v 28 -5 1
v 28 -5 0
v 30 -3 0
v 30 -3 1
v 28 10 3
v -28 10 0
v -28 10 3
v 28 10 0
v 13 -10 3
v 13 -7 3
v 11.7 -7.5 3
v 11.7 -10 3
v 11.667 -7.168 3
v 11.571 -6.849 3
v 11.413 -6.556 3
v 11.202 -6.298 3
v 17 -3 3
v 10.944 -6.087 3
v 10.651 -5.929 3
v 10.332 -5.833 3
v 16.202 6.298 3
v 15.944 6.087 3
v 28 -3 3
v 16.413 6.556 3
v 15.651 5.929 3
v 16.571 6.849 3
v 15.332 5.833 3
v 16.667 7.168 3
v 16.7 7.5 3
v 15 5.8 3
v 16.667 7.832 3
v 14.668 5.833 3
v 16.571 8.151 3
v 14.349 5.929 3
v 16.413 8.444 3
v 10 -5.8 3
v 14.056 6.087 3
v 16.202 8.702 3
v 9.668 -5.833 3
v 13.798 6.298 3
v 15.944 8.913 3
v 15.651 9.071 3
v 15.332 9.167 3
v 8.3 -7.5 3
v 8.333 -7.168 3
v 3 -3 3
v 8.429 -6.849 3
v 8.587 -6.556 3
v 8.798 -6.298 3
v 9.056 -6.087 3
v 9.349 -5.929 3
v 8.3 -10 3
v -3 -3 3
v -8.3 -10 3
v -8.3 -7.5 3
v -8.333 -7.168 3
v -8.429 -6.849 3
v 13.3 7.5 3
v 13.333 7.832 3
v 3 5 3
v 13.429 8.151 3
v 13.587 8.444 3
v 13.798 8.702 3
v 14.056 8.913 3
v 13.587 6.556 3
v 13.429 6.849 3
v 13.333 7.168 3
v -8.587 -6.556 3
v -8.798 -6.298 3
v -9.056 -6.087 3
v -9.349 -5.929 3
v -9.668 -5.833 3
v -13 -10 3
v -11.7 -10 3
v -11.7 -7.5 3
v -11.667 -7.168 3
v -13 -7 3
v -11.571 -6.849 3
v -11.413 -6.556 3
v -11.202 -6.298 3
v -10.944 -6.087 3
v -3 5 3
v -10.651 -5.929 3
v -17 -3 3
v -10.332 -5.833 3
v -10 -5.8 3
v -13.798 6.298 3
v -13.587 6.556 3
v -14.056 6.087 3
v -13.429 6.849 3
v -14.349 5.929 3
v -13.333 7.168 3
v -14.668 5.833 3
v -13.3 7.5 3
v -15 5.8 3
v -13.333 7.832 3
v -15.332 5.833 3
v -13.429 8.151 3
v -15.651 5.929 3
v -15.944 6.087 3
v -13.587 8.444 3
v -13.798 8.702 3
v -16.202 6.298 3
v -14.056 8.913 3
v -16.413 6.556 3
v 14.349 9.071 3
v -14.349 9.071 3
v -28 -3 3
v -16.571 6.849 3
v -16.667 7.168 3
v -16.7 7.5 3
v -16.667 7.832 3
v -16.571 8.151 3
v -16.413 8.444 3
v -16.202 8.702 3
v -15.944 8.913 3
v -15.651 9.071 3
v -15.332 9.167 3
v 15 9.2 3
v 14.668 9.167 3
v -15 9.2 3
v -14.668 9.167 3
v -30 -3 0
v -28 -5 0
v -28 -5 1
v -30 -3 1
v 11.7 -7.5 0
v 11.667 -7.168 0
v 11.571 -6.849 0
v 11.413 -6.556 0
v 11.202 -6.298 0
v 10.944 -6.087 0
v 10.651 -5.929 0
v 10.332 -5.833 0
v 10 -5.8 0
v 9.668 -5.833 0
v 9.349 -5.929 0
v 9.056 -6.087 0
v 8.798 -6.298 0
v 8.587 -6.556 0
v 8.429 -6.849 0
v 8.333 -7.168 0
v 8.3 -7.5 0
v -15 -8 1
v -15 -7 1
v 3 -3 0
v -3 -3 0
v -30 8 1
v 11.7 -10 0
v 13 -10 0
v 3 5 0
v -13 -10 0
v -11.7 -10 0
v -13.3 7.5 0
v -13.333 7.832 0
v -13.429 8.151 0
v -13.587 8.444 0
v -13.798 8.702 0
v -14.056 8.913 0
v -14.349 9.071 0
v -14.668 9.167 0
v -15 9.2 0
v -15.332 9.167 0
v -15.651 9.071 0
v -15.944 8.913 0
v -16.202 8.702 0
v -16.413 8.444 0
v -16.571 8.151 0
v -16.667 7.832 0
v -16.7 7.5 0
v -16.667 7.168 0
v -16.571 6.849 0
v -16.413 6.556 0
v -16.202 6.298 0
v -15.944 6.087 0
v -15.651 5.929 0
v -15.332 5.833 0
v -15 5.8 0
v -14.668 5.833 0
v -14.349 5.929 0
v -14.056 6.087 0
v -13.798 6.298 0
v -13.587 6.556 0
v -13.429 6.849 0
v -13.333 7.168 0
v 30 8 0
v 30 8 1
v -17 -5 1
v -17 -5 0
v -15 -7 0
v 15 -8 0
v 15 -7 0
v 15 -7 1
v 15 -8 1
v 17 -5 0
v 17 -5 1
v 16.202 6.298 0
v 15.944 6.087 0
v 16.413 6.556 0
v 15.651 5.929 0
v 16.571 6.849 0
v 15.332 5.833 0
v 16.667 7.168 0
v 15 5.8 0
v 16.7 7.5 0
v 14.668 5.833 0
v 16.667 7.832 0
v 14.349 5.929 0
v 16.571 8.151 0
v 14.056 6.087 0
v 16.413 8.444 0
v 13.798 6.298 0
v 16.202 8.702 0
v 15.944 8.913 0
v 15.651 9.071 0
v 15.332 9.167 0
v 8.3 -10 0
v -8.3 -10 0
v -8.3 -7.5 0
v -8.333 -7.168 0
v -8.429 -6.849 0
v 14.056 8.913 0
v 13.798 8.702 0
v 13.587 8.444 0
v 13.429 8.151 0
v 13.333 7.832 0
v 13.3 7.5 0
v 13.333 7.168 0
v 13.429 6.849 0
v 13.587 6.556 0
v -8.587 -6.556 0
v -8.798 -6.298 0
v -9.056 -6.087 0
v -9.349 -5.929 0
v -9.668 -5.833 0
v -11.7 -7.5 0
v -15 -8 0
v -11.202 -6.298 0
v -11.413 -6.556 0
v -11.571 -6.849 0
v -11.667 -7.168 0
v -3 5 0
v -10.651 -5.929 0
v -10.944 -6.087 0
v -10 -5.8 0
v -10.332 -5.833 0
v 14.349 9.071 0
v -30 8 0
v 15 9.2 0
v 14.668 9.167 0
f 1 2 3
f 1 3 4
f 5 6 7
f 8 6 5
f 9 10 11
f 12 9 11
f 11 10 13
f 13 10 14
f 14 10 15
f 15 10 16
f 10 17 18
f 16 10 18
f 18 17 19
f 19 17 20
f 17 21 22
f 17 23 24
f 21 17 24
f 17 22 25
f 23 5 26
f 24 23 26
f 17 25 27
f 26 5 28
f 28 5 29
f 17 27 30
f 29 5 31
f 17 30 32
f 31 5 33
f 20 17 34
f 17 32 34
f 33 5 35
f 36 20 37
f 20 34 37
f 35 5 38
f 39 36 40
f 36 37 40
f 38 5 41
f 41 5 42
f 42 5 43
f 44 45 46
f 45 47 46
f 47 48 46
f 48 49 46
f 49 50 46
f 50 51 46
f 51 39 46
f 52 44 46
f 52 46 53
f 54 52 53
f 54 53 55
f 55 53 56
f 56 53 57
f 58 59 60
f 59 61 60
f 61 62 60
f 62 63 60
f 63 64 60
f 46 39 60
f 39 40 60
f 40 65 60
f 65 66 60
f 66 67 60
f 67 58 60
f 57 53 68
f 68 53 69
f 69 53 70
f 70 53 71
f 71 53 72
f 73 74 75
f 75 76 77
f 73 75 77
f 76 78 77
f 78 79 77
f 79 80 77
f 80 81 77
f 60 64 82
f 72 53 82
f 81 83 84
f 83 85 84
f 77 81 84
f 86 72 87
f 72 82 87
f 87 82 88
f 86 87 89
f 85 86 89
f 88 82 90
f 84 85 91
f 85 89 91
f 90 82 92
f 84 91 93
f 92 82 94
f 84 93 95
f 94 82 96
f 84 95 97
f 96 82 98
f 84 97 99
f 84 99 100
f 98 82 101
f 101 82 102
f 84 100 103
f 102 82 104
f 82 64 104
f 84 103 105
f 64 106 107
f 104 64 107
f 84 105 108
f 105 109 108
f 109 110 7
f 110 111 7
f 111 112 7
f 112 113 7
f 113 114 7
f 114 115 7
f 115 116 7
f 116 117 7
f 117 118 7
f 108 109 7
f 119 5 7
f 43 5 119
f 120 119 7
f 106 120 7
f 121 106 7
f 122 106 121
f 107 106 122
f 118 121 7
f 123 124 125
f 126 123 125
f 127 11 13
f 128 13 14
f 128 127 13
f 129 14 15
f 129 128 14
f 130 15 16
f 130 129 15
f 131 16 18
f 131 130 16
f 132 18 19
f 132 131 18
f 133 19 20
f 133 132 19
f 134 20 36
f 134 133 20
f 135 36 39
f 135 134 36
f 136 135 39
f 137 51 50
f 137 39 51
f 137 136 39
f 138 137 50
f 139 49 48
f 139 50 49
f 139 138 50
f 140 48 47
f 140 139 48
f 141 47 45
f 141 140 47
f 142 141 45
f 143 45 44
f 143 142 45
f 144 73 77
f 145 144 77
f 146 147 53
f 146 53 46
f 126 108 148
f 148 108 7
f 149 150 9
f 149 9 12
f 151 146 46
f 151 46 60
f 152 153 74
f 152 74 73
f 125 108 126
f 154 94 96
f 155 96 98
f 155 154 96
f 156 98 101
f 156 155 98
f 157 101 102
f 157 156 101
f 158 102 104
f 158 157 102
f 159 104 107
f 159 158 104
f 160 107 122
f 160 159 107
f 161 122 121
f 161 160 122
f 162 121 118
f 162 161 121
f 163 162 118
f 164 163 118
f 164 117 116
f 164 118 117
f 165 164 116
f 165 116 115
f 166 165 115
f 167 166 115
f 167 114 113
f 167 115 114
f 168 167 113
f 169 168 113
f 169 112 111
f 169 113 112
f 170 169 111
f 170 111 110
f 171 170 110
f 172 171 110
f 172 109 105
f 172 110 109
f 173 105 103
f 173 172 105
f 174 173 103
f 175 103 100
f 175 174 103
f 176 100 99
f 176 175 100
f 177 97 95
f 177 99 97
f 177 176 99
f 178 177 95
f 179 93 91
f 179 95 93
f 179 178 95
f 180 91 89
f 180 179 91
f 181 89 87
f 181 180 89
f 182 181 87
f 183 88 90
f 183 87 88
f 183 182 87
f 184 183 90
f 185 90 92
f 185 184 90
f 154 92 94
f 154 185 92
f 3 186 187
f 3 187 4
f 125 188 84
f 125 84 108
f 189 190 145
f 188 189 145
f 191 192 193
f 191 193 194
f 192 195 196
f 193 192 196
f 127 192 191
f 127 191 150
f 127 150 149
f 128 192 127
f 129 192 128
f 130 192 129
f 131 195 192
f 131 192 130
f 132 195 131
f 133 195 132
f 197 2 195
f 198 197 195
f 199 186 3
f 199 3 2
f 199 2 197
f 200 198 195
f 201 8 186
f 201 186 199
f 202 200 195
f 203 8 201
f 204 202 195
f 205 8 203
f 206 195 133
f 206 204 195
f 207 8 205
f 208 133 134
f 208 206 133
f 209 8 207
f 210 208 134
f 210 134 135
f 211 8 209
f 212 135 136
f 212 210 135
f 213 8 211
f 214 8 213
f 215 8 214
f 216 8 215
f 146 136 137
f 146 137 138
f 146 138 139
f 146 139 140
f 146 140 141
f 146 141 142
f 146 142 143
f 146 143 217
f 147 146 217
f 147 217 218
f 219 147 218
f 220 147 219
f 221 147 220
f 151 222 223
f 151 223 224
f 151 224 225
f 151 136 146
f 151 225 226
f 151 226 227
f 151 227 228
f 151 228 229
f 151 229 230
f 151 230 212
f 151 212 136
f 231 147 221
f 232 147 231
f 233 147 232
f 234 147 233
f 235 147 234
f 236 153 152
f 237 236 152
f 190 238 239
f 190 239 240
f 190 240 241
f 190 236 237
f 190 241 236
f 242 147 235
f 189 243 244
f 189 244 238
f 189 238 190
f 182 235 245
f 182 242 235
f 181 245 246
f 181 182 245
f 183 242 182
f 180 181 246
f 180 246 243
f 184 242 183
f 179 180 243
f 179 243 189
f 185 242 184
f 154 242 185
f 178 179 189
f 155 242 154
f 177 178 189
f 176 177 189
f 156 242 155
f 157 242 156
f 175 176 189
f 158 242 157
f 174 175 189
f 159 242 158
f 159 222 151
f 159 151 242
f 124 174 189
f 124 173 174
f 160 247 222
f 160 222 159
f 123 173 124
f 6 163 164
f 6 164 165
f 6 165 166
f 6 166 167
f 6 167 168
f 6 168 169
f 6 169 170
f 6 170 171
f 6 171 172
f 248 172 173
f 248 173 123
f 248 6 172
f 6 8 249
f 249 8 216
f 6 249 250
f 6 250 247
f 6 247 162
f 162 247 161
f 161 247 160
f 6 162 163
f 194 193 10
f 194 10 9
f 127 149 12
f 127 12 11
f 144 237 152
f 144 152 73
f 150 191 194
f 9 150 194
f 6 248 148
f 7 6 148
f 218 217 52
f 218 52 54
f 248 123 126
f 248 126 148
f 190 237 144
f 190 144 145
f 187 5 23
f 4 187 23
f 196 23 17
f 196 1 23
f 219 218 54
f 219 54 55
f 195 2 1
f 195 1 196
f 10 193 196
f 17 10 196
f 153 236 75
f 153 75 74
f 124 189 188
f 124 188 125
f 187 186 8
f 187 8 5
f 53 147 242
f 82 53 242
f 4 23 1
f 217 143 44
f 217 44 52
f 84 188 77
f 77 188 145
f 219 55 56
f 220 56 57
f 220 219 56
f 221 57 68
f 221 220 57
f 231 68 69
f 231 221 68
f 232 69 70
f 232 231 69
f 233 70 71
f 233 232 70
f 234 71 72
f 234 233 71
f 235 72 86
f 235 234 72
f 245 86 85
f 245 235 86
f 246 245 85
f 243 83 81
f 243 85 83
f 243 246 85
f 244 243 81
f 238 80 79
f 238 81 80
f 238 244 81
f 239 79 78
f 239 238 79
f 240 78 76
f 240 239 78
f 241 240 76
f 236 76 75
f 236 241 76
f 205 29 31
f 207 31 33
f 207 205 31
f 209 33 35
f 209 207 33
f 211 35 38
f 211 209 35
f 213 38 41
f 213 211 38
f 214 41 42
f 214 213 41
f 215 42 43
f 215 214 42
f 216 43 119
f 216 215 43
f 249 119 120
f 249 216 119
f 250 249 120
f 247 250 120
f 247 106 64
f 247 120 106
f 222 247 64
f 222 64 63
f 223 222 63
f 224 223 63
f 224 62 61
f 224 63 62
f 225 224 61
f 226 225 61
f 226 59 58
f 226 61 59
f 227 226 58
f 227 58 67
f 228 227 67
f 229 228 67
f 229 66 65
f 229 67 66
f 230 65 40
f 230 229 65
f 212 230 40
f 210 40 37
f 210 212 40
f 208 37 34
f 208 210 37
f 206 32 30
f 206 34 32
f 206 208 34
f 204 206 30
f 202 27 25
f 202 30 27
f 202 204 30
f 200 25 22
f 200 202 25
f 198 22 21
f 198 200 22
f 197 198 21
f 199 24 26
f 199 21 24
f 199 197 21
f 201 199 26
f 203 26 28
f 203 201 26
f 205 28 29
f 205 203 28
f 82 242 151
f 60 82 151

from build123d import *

# Parameters (mm, degrees)
PAD001_DEPTH    = 3
SKETCH004_W     = 6
SKETCH004_H     = 8
POCKET002_DEPTH = 5
SKETCH005_R     = 1.7
HOLE_DEPTH      = 25
CHAMFER001_SIZE = 2
POCKET005_DEPTH = 5


with BuildPart() as part:
    # Sketch003 → Pad001 (new body)
    with BuildSketch(Plane.XY):
        Polygon((-30, 10), (30, 10), (30, -5), (15, -5), (15, -10), (-15, -10), (-15, -5), (-30, -5), align=None)
    extrude(amount=PAD001_DEPTH)

    # Sketch004 → Pocket002 (cut)
    with BuildSketch(Plane.XY):
        with Locations((0, 1)):
            Rectangle(SKETCH004_W, SKETCH004_H)
    extrude(amount=POCKET002_DEPTH, mode=Mode.SUBTRACT)

    # Sketch005 → Hole (cut)
    with BuildSketch(Plane.XY):
        with Locations((-15, 7.5)):
            Circle(SKETCH005_R)
        with Locations((15, 7.5)):
            Circle(SKETCH005_R)
        with Locations((-10, -7.5)):
            Circle(SKETCH005_R)
        with Locations((10, -7.5)):
            Circle(SKETCH005_R)
    extrude(amount=HOLE_DEPTH, mode=Mode.SUBTRACT)

    # Chamfer001
    chamfer001_edges = [part.edges().sort_by_distance(p)[0] for p in [
        (-30, 10, 1.5),
        (30, 10, 1.5),
        (-30, 2.5, 3),
        (-22.5, -5, 3),
        (-15, -7.5, 3),
        (15, -7.5, 3),
        (22.5, -5, 3),
        (30, 2.5, 3),
        (30, -5, 1.5),
        (15, -10, 1.5),
        (15, -5, 1.5),
        (-15, -10, 1.5),
        (-15, -5, 1.5),
        (-30, -5, 1.5),
    ]]
    chamfer(chamfer001_edges, length=CHAMFER001_SIZE)

    # Sketch014 → Pocket005 (cut)
    with BuildSketch(Plane.XY):
        with BuildLine():
            Line((-11.7, -7.5), (-11.7, -10))
            Line((-11.7, -10), (-8.3, -10))
            Line((-8.3, -10), (-8.3, -7.5))
            ThreePointArc((-8.3, -7.5), (-10, -5.8), (-11.7, -7.5))
        make_face()
        with BuildLine():
            Line((8.3, -7.5), (8.3, -10))
            Line((8.3, -10), (11.7, -10))
            Line((11.7, -10), (11.7, -7.5))
            ThreePointArc((11.7, -7.5), (10, -5.8), (8.3, -7.5))
        make_face()
    extrude(amount=POCKET005_DEPTH, mode=Mode.SUBTRACT)


solid = part.part
